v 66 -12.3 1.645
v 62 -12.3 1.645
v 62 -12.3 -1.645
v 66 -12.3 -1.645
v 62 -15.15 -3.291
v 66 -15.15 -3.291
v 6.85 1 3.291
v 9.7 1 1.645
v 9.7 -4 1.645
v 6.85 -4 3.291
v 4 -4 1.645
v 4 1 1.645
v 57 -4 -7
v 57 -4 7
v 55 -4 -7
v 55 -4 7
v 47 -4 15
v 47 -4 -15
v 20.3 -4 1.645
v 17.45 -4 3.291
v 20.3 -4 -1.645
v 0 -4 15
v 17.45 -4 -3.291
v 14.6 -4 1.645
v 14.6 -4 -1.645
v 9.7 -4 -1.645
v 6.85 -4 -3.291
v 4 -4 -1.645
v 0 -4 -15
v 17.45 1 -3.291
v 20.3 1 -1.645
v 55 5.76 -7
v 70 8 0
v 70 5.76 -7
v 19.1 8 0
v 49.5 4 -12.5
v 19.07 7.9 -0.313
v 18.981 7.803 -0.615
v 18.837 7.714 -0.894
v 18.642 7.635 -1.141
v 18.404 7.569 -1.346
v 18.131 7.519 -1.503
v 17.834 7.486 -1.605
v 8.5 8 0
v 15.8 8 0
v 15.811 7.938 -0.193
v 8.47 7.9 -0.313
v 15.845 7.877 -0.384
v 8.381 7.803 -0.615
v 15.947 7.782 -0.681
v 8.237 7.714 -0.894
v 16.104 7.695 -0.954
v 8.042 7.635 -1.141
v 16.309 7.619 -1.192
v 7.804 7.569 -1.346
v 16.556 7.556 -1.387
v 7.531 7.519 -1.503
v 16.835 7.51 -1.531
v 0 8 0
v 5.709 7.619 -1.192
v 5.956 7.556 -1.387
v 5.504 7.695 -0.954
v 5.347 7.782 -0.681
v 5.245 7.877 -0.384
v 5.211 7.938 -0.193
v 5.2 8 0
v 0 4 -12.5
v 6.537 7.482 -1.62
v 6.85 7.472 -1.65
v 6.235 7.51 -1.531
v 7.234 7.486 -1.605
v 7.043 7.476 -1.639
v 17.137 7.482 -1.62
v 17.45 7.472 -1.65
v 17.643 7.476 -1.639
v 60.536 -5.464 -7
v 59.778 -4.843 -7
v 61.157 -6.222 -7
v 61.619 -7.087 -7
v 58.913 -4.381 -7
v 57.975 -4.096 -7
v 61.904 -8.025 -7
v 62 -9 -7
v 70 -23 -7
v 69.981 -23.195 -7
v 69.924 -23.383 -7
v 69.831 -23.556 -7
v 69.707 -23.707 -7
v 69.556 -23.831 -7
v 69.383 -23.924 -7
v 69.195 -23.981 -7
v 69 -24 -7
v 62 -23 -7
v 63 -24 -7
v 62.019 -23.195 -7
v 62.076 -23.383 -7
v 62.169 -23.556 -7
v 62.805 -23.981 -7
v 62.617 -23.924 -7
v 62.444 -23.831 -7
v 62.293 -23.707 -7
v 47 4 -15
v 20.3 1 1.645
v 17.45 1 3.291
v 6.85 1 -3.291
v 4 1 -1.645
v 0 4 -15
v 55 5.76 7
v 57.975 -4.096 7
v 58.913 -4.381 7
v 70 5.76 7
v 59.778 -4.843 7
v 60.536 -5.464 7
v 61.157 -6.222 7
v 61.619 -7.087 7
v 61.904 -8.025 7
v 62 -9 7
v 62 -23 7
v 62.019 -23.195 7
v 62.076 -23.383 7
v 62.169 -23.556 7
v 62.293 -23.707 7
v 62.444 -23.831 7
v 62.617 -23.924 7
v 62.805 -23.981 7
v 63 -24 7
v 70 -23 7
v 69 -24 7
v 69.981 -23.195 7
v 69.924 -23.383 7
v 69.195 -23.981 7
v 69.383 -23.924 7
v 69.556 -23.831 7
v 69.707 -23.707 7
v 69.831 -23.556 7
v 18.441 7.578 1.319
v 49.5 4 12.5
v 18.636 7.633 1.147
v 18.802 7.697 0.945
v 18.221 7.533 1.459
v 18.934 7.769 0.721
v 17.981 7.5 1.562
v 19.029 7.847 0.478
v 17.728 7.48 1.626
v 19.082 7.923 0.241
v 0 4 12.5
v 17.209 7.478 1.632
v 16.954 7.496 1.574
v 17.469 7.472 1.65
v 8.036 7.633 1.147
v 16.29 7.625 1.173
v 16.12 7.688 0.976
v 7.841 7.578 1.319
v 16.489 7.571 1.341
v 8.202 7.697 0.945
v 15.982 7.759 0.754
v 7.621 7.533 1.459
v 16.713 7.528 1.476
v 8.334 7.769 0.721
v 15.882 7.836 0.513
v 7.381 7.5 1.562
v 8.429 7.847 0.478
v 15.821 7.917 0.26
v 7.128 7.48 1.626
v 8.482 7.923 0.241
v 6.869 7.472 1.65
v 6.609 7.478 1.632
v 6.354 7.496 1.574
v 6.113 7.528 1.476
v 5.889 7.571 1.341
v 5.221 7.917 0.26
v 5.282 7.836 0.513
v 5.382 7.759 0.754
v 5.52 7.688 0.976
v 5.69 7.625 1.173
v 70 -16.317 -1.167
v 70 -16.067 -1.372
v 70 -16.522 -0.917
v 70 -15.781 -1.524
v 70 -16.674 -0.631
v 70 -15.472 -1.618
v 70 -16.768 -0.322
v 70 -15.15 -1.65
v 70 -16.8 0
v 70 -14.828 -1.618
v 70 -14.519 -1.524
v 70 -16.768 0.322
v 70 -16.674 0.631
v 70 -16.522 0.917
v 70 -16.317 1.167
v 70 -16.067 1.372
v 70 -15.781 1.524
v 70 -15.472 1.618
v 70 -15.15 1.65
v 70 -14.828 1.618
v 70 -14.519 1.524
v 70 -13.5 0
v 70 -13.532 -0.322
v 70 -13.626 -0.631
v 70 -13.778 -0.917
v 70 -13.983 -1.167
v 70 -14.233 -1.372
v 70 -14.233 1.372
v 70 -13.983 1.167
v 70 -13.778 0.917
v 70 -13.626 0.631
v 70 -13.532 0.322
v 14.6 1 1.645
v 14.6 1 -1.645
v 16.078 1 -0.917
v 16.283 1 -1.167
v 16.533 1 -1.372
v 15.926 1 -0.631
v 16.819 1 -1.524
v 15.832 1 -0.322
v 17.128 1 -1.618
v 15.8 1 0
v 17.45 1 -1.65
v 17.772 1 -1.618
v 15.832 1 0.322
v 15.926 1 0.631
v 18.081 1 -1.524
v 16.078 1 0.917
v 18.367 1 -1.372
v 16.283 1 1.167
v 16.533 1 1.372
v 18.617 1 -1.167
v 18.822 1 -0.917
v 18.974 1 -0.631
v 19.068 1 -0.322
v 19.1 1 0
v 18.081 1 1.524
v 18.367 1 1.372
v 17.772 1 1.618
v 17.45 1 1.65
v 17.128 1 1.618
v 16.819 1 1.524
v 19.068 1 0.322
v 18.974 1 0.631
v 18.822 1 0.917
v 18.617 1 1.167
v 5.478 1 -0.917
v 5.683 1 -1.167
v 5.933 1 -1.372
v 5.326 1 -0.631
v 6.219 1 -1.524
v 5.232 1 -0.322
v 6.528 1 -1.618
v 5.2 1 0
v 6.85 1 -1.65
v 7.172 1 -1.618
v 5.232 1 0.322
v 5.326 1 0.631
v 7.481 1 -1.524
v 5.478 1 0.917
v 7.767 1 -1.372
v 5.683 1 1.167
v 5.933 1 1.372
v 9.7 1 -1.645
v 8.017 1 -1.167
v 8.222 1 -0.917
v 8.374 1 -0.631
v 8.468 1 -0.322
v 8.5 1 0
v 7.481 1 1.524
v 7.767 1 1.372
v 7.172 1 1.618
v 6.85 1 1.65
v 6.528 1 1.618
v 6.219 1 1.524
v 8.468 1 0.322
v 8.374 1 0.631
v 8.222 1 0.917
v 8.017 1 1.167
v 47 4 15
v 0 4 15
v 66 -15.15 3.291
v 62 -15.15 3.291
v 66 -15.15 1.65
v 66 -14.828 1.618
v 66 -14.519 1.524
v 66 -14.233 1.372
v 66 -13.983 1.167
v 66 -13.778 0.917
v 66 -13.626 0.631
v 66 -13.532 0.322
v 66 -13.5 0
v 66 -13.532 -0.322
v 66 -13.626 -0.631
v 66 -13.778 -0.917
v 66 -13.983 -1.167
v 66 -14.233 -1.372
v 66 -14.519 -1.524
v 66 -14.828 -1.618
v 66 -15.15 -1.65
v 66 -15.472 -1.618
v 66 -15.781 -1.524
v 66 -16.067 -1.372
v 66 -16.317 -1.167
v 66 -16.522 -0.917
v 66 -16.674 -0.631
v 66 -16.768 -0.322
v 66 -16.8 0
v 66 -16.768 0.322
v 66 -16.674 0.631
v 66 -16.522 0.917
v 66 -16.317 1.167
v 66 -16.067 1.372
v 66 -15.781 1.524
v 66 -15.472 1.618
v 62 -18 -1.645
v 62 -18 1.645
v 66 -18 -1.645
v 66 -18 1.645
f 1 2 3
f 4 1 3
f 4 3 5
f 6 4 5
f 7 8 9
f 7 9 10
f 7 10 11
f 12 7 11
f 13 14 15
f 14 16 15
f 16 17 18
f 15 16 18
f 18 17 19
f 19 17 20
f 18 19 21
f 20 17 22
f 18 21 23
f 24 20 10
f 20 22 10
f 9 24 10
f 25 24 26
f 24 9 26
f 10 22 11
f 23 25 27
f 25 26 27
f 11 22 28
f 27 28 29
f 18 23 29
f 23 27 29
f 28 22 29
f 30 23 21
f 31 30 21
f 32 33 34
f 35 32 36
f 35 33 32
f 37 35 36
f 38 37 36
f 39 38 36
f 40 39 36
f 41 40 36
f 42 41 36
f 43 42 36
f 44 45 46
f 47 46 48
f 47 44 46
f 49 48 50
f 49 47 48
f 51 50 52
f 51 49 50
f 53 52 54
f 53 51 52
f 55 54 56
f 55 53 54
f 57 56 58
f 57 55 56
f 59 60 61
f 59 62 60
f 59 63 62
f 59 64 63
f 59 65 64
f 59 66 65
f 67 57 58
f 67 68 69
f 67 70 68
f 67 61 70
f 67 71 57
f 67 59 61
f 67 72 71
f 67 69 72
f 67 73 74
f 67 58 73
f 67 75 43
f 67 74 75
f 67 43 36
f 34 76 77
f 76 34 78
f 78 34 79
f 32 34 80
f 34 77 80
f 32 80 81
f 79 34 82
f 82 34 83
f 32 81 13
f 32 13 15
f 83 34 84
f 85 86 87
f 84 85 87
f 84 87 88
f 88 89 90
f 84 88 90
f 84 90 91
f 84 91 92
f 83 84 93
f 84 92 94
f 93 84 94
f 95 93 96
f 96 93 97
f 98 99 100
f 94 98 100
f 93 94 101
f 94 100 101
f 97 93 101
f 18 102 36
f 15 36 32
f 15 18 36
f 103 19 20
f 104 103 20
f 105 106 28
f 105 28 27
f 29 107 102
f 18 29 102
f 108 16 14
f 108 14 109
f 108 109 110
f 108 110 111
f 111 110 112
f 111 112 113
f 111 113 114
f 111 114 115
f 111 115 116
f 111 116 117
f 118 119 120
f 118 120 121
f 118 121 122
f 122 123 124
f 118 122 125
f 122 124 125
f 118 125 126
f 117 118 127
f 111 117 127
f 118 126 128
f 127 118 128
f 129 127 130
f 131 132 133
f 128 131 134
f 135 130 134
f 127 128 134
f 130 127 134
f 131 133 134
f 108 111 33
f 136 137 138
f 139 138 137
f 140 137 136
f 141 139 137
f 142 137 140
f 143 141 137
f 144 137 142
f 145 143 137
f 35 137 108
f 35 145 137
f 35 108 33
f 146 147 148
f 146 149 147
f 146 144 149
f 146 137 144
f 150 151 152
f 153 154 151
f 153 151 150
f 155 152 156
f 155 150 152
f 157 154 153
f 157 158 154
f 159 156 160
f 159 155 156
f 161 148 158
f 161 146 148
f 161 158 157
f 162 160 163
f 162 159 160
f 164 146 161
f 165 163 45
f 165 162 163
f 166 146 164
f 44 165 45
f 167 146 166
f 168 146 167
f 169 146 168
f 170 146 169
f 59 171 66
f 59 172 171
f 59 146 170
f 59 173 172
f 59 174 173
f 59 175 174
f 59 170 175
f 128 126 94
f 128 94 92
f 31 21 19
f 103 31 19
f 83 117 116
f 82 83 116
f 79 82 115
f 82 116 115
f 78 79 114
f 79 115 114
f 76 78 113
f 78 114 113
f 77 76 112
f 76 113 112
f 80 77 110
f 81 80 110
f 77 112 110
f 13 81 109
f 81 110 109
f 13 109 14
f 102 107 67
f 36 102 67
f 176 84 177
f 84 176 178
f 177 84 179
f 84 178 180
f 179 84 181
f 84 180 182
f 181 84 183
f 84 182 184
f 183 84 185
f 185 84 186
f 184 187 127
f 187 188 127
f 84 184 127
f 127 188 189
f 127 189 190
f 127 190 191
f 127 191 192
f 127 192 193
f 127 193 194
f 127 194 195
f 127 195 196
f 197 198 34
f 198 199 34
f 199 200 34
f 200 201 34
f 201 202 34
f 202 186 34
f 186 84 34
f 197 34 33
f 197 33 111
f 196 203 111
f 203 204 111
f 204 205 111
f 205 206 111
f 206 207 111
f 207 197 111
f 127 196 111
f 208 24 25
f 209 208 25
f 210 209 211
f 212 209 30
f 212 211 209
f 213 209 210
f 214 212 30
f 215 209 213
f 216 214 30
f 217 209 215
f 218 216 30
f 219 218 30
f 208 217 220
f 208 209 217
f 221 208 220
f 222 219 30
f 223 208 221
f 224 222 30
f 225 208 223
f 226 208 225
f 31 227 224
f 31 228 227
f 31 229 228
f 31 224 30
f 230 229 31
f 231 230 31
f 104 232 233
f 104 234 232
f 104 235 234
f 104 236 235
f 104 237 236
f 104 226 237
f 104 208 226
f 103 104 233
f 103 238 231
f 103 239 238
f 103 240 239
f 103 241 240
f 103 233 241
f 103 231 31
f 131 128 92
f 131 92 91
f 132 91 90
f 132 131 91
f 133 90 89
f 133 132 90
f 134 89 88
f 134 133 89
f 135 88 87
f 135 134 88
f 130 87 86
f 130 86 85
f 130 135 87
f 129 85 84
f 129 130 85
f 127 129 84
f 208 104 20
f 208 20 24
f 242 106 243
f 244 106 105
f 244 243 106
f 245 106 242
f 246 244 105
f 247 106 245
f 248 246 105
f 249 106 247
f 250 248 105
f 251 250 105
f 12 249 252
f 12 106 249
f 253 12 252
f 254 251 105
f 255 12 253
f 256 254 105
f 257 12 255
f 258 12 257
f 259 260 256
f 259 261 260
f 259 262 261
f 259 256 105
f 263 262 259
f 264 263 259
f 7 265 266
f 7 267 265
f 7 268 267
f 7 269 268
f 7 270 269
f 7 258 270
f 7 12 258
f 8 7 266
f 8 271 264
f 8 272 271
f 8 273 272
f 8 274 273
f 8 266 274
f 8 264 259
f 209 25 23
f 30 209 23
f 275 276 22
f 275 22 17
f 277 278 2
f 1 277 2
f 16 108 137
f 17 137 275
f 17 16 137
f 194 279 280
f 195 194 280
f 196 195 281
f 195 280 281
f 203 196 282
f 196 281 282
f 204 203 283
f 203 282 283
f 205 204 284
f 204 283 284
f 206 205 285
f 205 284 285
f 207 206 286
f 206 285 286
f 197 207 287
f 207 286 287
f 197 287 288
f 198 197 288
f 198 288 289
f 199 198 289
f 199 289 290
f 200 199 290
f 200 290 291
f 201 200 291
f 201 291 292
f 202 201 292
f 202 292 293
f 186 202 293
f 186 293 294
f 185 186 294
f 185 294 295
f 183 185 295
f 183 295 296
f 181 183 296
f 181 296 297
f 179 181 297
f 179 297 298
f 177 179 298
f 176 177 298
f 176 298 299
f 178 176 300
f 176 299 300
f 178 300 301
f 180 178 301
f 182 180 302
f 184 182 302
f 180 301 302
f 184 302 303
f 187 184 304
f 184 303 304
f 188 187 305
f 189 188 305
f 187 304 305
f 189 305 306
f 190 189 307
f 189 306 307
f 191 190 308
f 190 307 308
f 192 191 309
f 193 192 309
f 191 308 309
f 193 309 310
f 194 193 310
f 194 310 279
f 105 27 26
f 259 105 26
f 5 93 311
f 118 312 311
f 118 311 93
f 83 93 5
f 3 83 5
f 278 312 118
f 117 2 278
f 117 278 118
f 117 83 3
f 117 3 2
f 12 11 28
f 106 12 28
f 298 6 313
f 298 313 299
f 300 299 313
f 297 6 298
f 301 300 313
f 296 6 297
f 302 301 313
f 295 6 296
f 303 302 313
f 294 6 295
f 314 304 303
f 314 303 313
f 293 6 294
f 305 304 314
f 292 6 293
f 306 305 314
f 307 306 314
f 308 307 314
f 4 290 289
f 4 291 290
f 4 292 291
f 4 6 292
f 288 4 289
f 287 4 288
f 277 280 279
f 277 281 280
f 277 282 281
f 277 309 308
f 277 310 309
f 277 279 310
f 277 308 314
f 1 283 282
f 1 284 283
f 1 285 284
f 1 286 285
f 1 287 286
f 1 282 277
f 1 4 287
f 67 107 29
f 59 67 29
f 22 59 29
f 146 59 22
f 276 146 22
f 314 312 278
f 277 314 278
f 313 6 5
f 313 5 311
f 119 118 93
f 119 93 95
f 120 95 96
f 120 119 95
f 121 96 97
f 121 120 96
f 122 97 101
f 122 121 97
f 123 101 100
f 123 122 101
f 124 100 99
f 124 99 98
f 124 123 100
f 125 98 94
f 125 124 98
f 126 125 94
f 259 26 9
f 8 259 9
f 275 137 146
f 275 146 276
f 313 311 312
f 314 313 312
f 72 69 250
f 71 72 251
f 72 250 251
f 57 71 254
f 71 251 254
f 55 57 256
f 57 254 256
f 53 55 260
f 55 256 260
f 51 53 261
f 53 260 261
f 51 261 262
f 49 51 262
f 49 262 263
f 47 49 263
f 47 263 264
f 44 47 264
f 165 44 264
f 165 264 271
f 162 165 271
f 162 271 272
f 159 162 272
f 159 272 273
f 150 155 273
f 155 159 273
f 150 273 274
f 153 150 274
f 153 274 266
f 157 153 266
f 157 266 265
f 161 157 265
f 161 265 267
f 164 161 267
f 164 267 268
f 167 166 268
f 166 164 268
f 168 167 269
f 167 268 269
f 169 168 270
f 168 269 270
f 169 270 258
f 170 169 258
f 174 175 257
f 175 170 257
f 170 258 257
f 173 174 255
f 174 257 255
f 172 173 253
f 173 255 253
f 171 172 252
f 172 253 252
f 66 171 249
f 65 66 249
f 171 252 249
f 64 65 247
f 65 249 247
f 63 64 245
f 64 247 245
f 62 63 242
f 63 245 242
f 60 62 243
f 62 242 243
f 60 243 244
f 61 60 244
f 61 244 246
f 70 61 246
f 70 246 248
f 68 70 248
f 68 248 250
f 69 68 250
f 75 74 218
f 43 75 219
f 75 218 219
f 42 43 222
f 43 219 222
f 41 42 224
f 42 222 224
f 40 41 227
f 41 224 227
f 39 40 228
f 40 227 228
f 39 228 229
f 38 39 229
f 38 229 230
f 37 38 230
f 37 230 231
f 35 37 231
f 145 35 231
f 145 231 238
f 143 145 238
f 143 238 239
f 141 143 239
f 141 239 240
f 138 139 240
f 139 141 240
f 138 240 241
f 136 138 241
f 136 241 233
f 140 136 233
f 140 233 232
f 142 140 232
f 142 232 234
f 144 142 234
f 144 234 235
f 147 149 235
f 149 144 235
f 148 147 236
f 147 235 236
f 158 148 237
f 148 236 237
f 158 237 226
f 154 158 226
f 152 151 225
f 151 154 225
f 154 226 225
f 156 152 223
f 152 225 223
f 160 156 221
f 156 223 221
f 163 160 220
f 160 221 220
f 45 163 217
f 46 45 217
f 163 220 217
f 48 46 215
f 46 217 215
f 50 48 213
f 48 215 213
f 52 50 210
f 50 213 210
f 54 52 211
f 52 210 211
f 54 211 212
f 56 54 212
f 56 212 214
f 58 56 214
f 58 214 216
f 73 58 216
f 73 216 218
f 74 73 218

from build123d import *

# Parameters (mm, degrees)
BOSS_EXTRUDE1_DEPTH = 70
SKETCH2_R           = 1.65
CUT_EXTRUDE1_DEPTH  = 5
SKETCH3_R           = 1.65
CUT_EXTRUDE2_DEPTH  = 61
SKETCH4_W           = 8
SKETCH4_H           = 30
BOSS_EXTRUDE2_DEPTH = 20
SKETCH5_R           = 1.65
CUT_EXTRUDE3_DEPTH  = 4
SKETCH6_R           = 1.65
CUT_EXTRUDE4_DEPTH  = 40
FILLET1_R           = 1
FILLET2_R           = 5
SKETCH7_W           = 6
SKETCH7_H           = 8
SKETCH7_W_2         = 1
CUT_EXTRUDE5_DEPTH  = 42
CHAMFER1_SIZE       = 10


with BuildPart() as part:
    # Sketch1 → Boss-Extrude1 (new body)
    with BuildSketch(Plane(origin=(0, 0, 0), x_dir=(0, 0, -1), z_dir=(1, 0, 0))):
        Polygon((0, 8), (12.5, 4), (-12.5, 4), align=None)
        Polygon((12.5, 4), (-12.5, 4), (-15, 4), (-15, -4), (15, -4), (15, 4), align=None)
    extrude(amount=BOSS_EXTRUDE1_DEPTH)

    # Sketch2 → Cut-Extrude1 (cut)
    # profile 1 of 2: a face of its own
    with BuildSketch(Plane.XZ.offset(4)):
        Polygon((6.85, 3.290896534), (4, 1.645448267), (4, -1.645448267), (6.85, -3.290896534), (9.7, -1.645448267), (9.7, 1.645448267), align=None)
        with Locations(Location((6.85, 0, 0), (0, 0, 270))):
            Circle(SKETCH2_R, mode=Mode.SUBTRACT)
    # profile 2 of 2: a face of its own
    with BuildSketch(Plane.XZ.offset(4)):
        Polygon((17.45, -3.290896534), (20.3, -1.645448267), (20.3, 1.645448267), (17.45, 3.290896534), (14.6, 1.645448267), (14.6, -1.645448267), align=None)
        with Locations(Location((17.45, 0, 0), (0, 0, 270))):
            Circle(SKETCH2_R, mode=Mode.SUBTRACT)
    extrude(amount=-CUT_EXTRUDE1_DEPTH, mode=Mode.SUBTRACT)

    # Sketch3 → Cut-Extrude2 (cut)
    with BuildSketch(Plane.XZ.offset(4)):
        with Locations(Location((6.85, 0, 0), (0, 0, 270))):
            Circle(SKETCH3_R)
        with Locations(Location((17.45, 0, 0), (0, 0, 270))):
            Circle(SKETCH3_R)
    extrude(amount=-CUT_EXTRUDE2_DEPTH, mode=Mode.SUBTRACT)

    # Sketch4 → Boss-Extrude2 (add)
    with BuildSketch(Plane.XZ.offset(4)):
        with Locations((66, 0)):
            Rectangle(SKETCH4_W, SKETCH4_H)
    extrude(amount=BOSS_EXTRUDE2_DEPTH)

    # Sketch5 → Cut-Extrude3 (cut)
    with BuildSketch(Plane.ZY.offset(-62)):
        Polygon((3.290896534, -15.15), (1.645448267, -12.3), (-1.645448267, -12.3), (-3.290896534, -15.15), (-1.645448267, -18), (1.645448267, -18), align=None)
        with Locations((0, -15.15)):
            Circle(SKETCH5_R, mode=Mode.SUBTRACT)
    extrude(amount=-CUT_EXTRUDE3_DEPTH, mode=Mode.SUBTRACT)

    # Sketch6 → Cut-Extrude4 (cut)
    with BuildSketch(Plane.ZY.offset(-62)):
        with Locations((0, -15.15)):
            Circle(SKETCH6_R)
    extrude(amount=-CUT_EXTRUDE4_DEPTH, mode=Mode.SUBTRACT)

    # Fillet1
    fillet1_edges = [part.edges().sort_by_distance(p)[0] for p in [
        (70, -24, 0),
        (62, -24, 0),
    ]]
    fillet(fillet1_edges, radius=FILLET1_R)

    # Fillet2
    fillet2_edges = [part.edges().sort_by_distance(p)[0] for p in [
        (62, -4, 0),
    ]]
    fillet(fillet2_edges, radius=FILLET2_R)

    # Sketch7 → Cut-Extrude5 (cut)
    with BuildSketch(Plane.XZ.offset(24)):
        with Locations((66, 11)):
            Rectangle(SKETCH7_W, SKETCH7_H)
        with Locations((69.5, 11)):
            Rectangle(SKETCH7_W_2, SKETCH7_H)
        with Locations((60, 11)):
            Rectangle(SKETCH7_W, SKETCH7_H)
        with Locations((60, -11)):
            Rectangle(SKETCH7_W, SKETCH7_H)
        with Locations((66, -11)):
            Rectangle(SKETCH7_W, SKETCH7_H)
        with Locations((69.5, -11)):
            Rectangle(SKETCH7_W_2, SKETCH7_H)
    extrude(amount=-CUT_EXTRUDE5_DEPTH, mode=Mode.SUBTRACT)

    # Chamfer1
    # the kernel refuses this chamfer: 10 mm, written as the material it takes off along each edge
    with BuildSketch(Plane(origin=(57, -29.71682988, 15), x_dir=(0.027495876610587014, 0, -0.9996219169112968), z_dir=(0, 1, 0))) as chamfer1_piece_1_section:
        Polygon((CHAMFER1_SIZE * 0.999621916911, CHAMFER1_SIZE * 0.0274958766106), (-CHAMFER1_SIZE * 0.0274958766106, CHAMFER1_SIZE * 0.999621916911), (0, 0), align=None)
    chamfer1_piece_1 = extrude(amount=59.433659759, mode=Mode.PRIVATE)
    chamfer1_piece_1 = split(chamfer1_piece_1, bisect_by=Plane(origin=(53.542815877, 0, 7), z_dir=(0, 0, 1)), keep=Keep.TOP, mode=Mode.PRIVATE)
    add(chamfer1_piece_1, mode=Mode.SUBTRACT)
    with BuildSketch(Plane(origin=(57, -29.71682988, -15), x_dir=(-0.9996219169112968, 0, -0.027495876610586317), z_dir=(0, 1, 0))) as chamfer1_piece_2_section:
        Polygon((CHAMFER1_SIZE * 0.999621916911, CHAMFER1_SIZE * 0.0274958766106), (-CHAMFER1_SIZE * 0.0274958766106, CHAMFER1_SIZE * 0.999621916911), (0, 0), align=None)
    chamfer1_piece_2 = extrude(amount=59.433659759, mode=Mode.PRIVATE)
    chamfer1_piece_2 = split(chamfer1_piece_2, bisect_by=Plane(origin=(53.542815877, 0, -7), z_dir=(0, 0, -1)), keep=Keep.TOP, mode=Mode.PRIVATE)
    add(chamfer1_piece_2, mode=Mode.SUBTRACT)


solid = part.part
